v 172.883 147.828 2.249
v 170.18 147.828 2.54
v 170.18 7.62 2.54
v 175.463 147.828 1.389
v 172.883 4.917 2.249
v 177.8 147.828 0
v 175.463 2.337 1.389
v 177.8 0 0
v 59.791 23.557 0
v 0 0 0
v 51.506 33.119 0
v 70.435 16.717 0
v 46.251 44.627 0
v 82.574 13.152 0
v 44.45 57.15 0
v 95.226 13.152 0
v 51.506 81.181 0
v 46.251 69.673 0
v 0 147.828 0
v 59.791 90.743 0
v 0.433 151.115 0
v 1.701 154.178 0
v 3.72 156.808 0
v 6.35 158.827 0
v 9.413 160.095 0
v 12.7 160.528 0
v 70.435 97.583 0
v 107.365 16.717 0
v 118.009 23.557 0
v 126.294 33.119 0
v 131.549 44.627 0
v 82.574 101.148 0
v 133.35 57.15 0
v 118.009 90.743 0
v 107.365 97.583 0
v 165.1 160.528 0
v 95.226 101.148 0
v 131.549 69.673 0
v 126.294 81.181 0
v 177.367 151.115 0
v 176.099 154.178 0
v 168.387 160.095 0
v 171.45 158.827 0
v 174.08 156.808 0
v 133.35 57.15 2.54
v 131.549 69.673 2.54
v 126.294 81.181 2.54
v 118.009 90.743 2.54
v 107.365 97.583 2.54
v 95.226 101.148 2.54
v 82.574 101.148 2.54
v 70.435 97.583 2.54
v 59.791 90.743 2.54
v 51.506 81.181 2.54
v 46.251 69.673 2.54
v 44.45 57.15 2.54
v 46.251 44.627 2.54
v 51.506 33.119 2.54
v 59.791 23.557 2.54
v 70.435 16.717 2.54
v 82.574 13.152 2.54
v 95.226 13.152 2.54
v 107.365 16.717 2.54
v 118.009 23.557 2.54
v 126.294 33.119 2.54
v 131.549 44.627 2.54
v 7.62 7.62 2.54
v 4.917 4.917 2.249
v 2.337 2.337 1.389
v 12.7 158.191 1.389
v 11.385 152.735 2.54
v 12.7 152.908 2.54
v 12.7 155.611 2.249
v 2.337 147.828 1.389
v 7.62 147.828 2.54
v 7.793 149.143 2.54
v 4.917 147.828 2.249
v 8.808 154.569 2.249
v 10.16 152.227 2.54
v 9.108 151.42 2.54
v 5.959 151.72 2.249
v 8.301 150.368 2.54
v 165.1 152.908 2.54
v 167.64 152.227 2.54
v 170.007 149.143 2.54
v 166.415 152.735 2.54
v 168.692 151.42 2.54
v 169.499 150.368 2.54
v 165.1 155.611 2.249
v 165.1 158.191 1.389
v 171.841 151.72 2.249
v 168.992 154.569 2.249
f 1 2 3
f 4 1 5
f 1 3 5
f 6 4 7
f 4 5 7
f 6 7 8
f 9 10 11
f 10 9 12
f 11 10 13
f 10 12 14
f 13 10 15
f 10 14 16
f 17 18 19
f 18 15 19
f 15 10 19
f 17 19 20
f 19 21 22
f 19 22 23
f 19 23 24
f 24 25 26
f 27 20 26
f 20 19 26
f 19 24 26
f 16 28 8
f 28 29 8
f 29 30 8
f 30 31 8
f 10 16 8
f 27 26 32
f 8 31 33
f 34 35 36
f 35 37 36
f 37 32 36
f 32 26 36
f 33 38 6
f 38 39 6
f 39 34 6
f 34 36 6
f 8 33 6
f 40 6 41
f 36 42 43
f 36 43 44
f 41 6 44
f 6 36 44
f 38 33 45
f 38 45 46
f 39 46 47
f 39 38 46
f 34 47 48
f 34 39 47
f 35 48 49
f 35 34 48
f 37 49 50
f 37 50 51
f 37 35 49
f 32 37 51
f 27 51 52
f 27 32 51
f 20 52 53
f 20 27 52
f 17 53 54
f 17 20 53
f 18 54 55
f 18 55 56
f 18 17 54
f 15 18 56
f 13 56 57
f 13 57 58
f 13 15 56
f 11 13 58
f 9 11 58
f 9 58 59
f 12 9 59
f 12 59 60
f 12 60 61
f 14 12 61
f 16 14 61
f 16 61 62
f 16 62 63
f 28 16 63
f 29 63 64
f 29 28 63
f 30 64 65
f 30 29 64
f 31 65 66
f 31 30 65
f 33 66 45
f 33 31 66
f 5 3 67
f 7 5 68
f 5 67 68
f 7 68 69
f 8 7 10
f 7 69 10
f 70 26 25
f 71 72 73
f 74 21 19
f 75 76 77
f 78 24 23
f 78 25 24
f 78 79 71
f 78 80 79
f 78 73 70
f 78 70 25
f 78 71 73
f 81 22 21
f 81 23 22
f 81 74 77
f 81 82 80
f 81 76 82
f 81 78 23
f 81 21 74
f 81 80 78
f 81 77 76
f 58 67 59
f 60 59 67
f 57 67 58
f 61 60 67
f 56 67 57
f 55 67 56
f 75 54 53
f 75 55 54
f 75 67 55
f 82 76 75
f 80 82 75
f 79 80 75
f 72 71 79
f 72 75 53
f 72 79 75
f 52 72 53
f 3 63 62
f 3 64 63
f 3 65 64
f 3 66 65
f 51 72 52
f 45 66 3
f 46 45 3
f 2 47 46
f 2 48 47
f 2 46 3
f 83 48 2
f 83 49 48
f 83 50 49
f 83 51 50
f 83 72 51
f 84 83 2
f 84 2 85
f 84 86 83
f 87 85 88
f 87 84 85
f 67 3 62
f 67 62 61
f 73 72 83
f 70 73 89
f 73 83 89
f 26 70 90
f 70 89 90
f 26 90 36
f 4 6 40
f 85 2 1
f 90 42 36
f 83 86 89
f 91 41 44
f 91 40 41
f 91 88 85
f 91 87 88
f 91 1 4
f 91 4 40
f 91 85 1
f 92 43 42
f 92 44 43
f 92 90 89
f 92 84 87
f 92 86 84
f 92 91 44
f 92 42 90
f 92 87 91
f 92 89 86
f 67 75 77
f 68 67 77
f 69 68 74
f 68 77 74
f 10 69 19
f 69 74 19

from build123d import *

# Parameters (mm, degrees)
SKETCH1_W           = 177.8
SKETCH1_H           = 160.528
SKETCH1_R           = 44.45
BOSS_EXTRUDE1_DEPTH = 2.54
FILLET1_R           = 12.7
FILLET2_R           = 12.7


with BuildPart() as part:
    # Sketch1 → Boss-Extrude1 (new body)
    with BuildSketch(Plane.XY):
        with Locations((88.9, 80.264)):
            Rectangle(SKETCH1_W, SKETCH1_H)
        with Locations((88.9, 57.15)):
            Circle(SKETCH1_R, mode=Mode.SUBTRACT)
    extrude(amount=BOSS_EXTRUDE1_DEPTH)

    # Fillet1
    fillet1_edges = [part.edges().sort_by_distance(p)[0] for p in [
        (0, 160.528, 1.27),
        (177.8, 160.528, 1.27),
    ]]
    fillet(fillet1_edges, radius=FILLET1_R)

    # Fillet2
    # the kernel refuses this fillet: 12.7 mm, written as the material it takes off along each edge
    with BuildSketch(Plane(origin=(177.8, -19.05, 2.54), x_dir=(0, 0, -1), z_dir=(0, 1, 0))) as fillet2_piece_1:
        with BuildLine():
            CenterArc((12.7, 7.62), FILLET2_R, 180, 36.869897646)
            Line((0, 7.62), (-0.254, 7.62))
            Line((-0.254, 7.62), (-0.254, 0))
            Line((-0.254, 0), (0, -0.254))
            ThreePointArc((0, -0.254), (1.27, -0.254), (2.3368, -0.1524))
            Line((2.3368, -0.1524), (2.54, 0))
        make_face()
    extrude(amount=166.878, mode=Mode.SUBTRACT)
    with BuildSketch(Plane(origin=(165.1, 147.828, 2.54), x_dir=(1, 0, 0), z_dir=(0, -1, 0))) as fillet2_piece_2:
        with BuildLine():
            CenterArc((5.08, -12.7), FILLET2_R, 53.130102354, 36.869897646)
            Line((5.08, 0), (5.08, 0.254))
            Line((5.08, 0.254), (12.7, 0.254))
            Line((12.7, 0.254), (12.954, 0))
            ThreePointArc((12.954, 0), (12.954, -1.27), (12.8524, -2.3368))
            Line((12.8524, -2.3368), (12.7, -2.54))
        make_face()
    revolve(axis=Axis((165.1, 147.828, 2.54), (0, 0, 1)), revolution_arc=90, mode=Mode.SUBTRACT)
    with BuildSketch(Plane(origin=(165.1, 160.528, 2.54), x_dir=(0, -1, 0), z_dir=(-1, 0, 0))) as fillet2_piece_3:
        with BuildLine():
            CenterArc((7.62, -12.7), FILLET2_R, 90, 36.869897646)
            Line((0, -2.54), (-0.1524, -2.3368))
            ThreePointArc((-0.1524, -2.3368), (-0.254, -1.27), (-0.254, 0))
            Line((-0.254, 0), (0, 0.254))
            Line((0, 0.254), (7.62, 0.254))
            Line((7.62, 0.254), (7.62, 0))
        make_face()
    extrude(amount=152.4, mode=Mode.SUBTRACT)
    with BuildSketch(Plane(origin=(12.7, 147.828, 2.54), x_dir=(0, 1, 0), z_dir=(1, 0, 0))) as fillet2_piece_4:
        with BuildLine():
            CenterArc((5.08, -12.7), FILLET2_R, 53.130102354, 36.869897646)
            Line((12.7, -2.54), (12.8524, -2.3368))
            ThreePointArc((12.8524, -2.3368), (12.954, -1.27), (12.954, 0))
            Line((12.954, 0), (12.7, 0.254))
            Line((12.7, 0.254), (5.08, 0.254))
            Line((5.08, 0.254), (5.08, 0))
        make_face()
    revolve(axis=Axis((12.7, 147.828, 2.54), (0, 0, 1)), revolution_arc=90, mode=Mode.SUBTRACT)
    with BuildSketch(Plane(origin=(0, 147.828, 2.54), x_dir=(1, 0, 0), z_dir=(0, -1, 0))) as fillet2_piece_5:
        with BuildLine():
            CenterArc((7.62, -12.7), FILLET2_R, 90, 36.869897646)
            Line((0, -2.54), (-0.1524, -2.3368))
            ThreePointArc((-0.1524, -2.3368), (-0.254, -1.27), (-0.254, 0))
            Line((-0.254, 0), (0, 0.254))
            Line((0, 0.254), (7.62, 0.254))
            Line((7.62, 0.254), (7.62, 0))
        make_face()
    extrude(amount=166.878, mode=Mode.SUBTRACT)
    with BuildSketch(Plane(origin=(-19.05, 0, 2.54), x_dir=(0, 0, -1), z_dir=(1, 0, 0))) as fillet2_piece_6:
        with BuildLine():
            CenterArc((12.7, 7.62), FILLET2_R, 180, 36.869897646)
            Line((0, 7.62), (-0.254, 7.62))
            Line((-0.254, 7.62), (-0.254, 0))
            Line((-0.254, 0), (0, -0.254))
            ThreePointArc((0, -0.254), (1.27, -0.254), (2.3368, -0.1524))
            Line((2.3368, -0.1524), (2.54, 0))
        make_face()
    extrude(amount=215.9, mode=Mode.SUBTRACT)


solid = part.part
